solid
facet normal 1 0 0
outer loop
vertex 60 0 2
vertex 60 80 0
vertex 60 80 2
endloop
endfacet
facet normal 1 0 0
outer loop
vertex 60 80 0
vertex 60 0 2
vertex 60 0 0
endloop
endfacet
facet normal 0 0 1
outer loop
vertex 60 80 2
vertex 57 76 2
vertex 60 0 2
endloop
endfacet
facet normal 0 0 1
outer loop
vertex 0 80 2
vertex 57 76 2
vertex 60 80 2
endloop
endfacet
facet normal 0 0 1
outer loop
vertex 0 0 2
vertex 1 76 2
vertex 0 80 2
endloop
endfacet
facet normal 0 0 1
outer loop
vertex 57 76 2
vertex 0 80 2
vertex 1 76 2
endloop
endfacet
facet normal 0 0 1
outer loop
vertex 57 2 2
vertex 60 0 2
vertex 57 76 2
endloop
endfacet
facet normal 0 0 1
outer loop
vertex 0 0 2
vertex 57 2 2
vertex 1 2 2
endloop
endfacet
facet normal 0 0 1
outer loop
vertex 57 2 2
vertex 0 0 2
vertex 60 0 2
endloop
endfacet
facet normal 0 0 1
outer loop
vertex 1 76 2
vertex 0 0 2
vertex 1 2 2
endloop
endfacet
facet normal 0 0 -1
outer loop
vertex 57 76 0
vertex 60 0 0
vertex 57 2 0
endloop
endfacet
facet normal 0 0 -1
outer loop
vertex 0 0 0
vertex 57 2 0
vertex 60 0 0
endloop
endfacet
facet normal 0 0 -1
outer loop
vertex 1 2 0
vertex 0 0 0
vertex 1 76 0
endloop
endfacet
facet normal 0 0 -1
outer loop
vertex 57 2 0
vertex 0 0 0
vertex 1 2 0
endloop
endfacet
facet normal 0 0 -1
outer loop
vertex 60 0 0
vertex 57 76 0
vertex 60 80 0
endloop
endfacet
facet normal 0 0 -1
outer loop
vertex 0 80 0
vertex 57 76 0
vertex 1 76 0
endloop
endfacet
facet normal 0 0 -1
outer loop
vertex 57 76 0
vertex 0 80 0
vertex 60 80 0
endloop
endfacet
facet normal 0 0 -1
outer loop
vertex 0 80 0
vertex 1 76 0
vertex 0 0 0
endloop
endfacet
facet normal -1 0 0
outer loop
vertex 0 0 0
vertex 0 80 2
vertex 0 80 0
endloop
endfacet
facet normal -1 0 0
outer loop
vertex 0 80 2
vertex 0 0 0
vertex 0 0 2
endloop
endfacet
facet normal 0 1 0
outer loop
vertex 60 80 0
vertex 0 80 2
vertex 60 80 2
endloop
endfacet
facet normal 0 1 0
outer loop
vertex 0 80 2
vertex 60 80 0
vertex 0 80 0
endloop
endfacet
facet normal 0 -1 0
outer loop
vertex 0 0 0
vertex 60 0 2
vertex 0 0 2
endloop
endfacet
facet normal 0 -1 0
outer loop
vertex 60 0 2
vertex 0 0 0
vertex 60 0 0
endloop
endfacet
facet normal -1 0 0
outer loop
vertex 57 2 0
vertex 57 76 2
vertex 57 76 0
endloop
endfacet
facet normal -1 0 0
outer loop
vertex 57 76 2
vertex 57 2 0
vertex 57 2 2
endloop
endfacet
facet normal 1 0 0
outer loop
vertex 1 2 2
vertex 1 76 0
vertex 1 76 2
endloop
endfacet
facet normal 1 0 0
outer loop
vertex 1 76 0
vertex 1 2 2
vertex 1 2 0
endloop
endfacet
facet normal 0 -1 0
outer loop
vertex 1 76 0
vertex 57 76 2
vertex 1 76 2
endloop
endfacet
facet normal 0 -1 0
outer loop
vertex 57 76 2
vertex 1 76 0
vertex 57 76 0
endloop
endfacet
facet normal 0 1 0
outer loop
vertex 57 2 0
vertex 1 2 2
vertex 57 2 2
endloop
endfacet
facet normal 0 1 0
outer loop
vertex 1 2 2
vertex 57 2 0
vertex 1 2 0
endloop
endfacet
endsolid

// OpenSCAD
//---------------------------------------------------------------------------------------------
//-- Printable servo tea bot
//-- (c) Martin Korinek	m.ko@inode.at
//-- April-2015
//---------------------------------------------------------------------------------------------
//--
//---------------------------------------------------------------------------------------------

//fragment minimum angle
  $fa=10.0;

//fragment minimum size
  $fs=0.2;
  
  lang=60;
  breit=80;
  
difference()
{
//big test incl 1mm 2mm 3mm 4mm 
	cube([lang,breit,2]);
	translate([1,2,0])
		cube([lang-4,breit-6,2]);
}
